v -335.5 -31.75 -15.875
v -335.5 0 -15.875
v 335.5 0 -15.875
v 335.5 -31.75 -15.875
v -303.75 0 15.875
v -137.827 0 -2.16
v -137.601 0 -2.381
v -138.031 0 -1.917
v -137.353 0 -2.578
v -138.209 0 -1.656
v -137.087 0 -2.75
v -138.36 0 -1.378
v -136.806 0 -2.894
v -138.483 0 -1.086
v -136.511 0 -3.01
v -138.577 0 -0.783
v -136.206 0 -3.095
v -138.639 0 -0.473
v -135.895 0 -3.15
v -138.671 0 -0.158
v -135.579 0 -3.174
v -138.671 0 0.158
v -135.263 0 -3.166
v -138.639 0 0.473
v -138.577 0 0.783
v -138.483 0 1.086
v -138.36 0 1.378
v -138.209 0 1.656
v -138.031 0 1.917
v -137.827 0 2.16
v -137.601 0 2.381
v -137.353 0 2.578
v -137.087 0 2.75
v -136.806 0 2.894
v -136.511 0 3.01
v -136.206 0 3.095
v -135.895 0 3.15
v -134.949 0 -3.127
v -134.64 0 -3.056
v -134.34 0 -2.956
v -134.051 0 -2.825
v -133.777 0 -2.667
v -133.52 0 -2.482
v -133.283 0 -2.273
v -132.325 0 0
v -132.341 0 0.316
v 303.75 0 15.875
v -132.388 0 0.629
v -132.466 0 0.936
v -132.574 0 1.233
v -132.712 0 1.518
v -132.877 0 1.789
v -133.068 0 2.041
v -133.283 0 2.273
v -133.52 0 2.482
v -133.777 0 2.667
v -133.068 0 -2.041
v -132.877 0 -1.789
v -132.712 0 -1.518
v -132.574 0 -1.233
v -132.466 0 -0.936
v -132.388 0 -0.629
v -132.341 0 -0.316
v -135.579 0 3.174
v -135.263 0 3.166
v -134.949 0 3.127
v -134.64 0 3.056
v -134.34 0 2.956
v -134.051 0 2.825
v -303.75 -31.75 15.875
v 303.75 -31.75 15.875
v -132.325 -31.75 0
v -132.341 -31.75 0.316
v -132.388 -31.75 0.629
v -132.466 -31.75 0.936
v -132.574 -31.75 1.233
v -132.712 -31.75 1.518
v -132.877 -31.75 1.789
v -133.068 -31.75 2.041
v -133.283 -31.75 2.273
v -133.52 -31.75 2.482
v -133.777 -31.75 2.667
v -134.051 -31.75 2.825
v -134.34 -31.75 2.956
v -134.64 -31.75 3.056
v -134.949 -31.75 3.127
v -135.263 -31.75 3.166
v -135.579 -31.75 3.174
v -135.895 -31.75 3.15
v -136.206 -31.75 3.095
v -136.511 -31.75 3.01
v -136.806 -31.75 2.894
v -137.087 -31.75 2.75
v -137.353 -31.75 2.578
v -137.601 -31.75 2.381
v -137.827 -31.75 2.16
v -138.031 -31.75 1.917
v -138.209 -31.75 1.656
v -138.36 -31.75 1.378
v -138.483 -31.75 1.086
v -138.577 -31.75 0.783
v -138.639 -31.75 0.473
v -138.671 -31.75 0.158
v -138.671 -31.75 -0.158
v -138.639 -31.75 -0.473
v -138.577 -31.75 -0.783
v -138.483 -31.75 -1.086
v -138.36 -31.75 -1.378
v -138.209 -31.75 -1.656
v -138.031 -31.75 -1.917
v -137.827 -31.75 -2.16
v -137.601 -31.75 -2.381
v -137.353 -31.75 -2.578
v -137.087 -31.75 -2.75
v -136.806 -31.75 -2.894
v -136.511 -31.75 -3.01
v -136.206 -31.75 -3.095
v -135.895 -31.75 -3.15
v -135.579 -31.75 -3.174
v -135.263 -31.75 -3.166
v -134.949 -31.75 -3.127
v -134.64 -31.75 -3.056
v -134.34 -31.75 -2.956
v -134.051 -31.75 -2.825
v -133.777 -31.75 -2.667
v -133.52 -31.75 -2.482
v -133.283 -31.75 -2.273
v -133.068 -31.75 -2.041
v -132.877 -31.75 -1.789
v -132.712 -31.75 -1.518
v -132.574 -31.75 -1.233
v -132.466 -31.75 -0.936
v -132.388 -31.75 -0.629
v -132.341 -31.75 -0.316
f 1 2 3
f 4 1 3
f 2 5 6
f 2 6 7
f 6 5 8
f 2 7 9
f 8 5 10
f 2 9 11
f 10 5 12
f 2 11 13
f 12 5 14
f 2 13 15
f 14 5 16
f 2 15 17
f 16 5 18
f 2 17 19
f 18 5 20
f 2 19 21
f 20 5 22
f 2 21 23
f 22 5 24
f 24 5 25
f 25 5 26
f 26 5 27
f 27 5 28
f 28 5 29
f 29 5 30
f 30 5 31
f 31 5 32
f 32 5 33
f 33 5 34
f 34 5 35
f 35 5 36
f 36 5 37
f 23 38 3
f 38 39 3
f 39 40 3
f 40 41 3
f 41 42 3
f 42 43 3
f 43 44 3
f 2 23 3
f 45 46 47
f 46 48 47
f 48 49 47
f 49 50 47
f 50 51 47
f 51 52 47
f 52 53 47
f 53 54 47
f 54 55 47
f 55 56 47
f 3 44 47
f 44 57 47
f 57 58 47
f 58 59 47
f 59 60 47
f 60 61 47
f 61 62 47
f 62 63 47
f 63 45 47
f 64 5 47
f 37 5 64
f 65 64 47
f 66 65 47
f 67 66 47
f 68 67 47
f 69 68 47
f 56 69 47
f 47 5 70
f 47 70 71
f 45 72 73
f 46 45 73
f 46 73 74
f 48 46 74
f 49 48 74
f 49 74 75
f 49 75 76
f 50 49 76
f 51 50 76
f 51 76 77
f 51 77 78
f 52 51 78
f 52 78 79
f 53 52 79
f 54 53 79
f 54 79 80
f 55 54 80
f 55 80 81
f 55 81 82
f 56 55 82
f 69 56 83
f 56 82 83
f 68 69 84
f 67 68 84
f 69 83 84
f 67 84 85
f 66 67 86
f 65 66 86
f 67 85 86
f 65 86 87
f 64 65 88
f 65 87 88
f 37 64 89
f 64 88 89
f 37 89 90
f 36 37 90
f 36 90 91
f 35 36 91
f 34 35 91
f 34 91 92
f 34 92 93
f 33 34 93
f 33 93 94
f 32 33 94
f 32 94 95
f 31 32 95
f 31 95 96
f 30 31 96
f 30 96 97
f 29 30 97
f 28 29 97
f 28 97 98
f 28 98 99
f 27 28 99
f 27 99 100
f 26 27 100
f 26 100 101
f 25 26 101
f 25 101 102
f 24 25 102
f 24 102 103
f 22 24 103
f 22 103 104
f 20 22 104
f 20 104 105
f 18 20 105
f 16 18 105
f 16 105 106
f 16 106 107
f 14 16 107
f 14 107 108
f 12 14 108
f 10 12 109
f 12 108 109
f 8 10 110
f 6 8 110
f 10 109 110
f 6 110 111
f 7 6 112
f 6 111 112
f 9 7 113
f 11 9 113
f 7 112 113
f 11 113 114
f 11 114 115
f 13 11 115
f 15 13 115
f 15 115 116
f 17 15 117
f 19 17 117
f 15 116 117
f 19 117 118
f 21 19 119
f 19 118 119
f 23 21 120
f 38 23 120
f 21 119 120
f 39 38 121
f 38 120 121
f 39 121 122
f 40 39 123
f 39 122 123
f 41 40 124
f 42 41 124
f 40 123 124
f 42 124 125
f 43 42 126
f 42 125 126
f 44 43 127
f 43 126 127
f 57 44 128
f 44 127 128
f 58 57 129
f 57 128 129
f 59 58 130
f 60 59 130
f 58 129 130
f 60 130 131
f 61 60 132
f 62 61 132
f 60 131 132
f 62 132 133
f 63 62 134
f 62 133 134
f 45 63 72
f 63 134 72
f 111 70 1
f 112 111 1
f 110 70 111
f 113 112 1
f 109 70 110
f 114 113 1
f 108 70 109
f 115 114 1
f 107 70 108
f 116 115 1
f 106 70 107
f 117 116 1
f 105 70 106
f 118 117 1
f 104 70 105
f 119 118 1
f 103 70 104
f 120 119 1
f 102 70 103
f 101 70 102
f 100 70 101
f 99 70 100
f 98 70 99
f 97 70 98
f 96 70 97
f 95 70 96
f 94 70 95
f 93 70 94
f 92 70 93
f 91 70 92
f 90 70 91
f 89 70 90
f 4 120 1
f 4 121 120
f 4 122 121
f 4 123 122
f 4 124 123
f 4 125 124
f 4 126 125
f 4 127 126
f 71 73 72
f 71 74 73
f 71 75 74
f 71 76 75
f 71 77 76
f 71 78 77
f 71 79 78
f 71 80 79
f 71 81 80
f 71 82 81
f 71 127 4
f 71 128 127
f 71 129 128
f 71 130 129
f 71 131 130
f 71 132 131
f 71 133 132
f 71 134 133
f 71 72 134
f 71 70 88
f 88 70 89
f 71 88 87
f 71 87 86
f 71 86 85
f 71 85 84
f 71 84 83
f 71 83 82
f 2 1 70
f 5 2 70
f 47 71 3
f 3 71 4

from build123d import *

# Parameters (mm, degrees)
F0_W     = 670.999928
F0_H     = 31.75
F1_DEPTH = 31.75
F3_DEPTH = 31.751
F4_R     = 3.175
F5_DEPTH = 31.751


with BuildPart() as f1:
    # F0 (on Front) → F1 (new body)
    with BuildSketch(Plane.XZ):
        Rectangle(F0_W, F0_H)
    extrude(amount=F1_DEPTH)

    # F2 (on face) → F3 (cut, through all)
    with BuildSketch(Plane.XZ.offset(31.75)):
        Polygon((-335.499964, 15.875), (-335.499964, -15.875), (-303.749964, 15.875), align=None)
        Polygon((303.749964, 15.875), (335.499964, -15.875), (335.499964, 15.875), align=None)
    extrude(amount=-F3_DEPTH, mode=Mode.SUBTRACT)

    # F4 (on face) → F5 (cut, through all)
    with BuildSketch(Plane.XZ.offset(31.75)):
        with Locations((-135.499856, 0)):
            Circle(F4_R)
    extrude(amount=-F5_DEPTH, mode=Mode.SUBTRACT)


solid = f1.part
